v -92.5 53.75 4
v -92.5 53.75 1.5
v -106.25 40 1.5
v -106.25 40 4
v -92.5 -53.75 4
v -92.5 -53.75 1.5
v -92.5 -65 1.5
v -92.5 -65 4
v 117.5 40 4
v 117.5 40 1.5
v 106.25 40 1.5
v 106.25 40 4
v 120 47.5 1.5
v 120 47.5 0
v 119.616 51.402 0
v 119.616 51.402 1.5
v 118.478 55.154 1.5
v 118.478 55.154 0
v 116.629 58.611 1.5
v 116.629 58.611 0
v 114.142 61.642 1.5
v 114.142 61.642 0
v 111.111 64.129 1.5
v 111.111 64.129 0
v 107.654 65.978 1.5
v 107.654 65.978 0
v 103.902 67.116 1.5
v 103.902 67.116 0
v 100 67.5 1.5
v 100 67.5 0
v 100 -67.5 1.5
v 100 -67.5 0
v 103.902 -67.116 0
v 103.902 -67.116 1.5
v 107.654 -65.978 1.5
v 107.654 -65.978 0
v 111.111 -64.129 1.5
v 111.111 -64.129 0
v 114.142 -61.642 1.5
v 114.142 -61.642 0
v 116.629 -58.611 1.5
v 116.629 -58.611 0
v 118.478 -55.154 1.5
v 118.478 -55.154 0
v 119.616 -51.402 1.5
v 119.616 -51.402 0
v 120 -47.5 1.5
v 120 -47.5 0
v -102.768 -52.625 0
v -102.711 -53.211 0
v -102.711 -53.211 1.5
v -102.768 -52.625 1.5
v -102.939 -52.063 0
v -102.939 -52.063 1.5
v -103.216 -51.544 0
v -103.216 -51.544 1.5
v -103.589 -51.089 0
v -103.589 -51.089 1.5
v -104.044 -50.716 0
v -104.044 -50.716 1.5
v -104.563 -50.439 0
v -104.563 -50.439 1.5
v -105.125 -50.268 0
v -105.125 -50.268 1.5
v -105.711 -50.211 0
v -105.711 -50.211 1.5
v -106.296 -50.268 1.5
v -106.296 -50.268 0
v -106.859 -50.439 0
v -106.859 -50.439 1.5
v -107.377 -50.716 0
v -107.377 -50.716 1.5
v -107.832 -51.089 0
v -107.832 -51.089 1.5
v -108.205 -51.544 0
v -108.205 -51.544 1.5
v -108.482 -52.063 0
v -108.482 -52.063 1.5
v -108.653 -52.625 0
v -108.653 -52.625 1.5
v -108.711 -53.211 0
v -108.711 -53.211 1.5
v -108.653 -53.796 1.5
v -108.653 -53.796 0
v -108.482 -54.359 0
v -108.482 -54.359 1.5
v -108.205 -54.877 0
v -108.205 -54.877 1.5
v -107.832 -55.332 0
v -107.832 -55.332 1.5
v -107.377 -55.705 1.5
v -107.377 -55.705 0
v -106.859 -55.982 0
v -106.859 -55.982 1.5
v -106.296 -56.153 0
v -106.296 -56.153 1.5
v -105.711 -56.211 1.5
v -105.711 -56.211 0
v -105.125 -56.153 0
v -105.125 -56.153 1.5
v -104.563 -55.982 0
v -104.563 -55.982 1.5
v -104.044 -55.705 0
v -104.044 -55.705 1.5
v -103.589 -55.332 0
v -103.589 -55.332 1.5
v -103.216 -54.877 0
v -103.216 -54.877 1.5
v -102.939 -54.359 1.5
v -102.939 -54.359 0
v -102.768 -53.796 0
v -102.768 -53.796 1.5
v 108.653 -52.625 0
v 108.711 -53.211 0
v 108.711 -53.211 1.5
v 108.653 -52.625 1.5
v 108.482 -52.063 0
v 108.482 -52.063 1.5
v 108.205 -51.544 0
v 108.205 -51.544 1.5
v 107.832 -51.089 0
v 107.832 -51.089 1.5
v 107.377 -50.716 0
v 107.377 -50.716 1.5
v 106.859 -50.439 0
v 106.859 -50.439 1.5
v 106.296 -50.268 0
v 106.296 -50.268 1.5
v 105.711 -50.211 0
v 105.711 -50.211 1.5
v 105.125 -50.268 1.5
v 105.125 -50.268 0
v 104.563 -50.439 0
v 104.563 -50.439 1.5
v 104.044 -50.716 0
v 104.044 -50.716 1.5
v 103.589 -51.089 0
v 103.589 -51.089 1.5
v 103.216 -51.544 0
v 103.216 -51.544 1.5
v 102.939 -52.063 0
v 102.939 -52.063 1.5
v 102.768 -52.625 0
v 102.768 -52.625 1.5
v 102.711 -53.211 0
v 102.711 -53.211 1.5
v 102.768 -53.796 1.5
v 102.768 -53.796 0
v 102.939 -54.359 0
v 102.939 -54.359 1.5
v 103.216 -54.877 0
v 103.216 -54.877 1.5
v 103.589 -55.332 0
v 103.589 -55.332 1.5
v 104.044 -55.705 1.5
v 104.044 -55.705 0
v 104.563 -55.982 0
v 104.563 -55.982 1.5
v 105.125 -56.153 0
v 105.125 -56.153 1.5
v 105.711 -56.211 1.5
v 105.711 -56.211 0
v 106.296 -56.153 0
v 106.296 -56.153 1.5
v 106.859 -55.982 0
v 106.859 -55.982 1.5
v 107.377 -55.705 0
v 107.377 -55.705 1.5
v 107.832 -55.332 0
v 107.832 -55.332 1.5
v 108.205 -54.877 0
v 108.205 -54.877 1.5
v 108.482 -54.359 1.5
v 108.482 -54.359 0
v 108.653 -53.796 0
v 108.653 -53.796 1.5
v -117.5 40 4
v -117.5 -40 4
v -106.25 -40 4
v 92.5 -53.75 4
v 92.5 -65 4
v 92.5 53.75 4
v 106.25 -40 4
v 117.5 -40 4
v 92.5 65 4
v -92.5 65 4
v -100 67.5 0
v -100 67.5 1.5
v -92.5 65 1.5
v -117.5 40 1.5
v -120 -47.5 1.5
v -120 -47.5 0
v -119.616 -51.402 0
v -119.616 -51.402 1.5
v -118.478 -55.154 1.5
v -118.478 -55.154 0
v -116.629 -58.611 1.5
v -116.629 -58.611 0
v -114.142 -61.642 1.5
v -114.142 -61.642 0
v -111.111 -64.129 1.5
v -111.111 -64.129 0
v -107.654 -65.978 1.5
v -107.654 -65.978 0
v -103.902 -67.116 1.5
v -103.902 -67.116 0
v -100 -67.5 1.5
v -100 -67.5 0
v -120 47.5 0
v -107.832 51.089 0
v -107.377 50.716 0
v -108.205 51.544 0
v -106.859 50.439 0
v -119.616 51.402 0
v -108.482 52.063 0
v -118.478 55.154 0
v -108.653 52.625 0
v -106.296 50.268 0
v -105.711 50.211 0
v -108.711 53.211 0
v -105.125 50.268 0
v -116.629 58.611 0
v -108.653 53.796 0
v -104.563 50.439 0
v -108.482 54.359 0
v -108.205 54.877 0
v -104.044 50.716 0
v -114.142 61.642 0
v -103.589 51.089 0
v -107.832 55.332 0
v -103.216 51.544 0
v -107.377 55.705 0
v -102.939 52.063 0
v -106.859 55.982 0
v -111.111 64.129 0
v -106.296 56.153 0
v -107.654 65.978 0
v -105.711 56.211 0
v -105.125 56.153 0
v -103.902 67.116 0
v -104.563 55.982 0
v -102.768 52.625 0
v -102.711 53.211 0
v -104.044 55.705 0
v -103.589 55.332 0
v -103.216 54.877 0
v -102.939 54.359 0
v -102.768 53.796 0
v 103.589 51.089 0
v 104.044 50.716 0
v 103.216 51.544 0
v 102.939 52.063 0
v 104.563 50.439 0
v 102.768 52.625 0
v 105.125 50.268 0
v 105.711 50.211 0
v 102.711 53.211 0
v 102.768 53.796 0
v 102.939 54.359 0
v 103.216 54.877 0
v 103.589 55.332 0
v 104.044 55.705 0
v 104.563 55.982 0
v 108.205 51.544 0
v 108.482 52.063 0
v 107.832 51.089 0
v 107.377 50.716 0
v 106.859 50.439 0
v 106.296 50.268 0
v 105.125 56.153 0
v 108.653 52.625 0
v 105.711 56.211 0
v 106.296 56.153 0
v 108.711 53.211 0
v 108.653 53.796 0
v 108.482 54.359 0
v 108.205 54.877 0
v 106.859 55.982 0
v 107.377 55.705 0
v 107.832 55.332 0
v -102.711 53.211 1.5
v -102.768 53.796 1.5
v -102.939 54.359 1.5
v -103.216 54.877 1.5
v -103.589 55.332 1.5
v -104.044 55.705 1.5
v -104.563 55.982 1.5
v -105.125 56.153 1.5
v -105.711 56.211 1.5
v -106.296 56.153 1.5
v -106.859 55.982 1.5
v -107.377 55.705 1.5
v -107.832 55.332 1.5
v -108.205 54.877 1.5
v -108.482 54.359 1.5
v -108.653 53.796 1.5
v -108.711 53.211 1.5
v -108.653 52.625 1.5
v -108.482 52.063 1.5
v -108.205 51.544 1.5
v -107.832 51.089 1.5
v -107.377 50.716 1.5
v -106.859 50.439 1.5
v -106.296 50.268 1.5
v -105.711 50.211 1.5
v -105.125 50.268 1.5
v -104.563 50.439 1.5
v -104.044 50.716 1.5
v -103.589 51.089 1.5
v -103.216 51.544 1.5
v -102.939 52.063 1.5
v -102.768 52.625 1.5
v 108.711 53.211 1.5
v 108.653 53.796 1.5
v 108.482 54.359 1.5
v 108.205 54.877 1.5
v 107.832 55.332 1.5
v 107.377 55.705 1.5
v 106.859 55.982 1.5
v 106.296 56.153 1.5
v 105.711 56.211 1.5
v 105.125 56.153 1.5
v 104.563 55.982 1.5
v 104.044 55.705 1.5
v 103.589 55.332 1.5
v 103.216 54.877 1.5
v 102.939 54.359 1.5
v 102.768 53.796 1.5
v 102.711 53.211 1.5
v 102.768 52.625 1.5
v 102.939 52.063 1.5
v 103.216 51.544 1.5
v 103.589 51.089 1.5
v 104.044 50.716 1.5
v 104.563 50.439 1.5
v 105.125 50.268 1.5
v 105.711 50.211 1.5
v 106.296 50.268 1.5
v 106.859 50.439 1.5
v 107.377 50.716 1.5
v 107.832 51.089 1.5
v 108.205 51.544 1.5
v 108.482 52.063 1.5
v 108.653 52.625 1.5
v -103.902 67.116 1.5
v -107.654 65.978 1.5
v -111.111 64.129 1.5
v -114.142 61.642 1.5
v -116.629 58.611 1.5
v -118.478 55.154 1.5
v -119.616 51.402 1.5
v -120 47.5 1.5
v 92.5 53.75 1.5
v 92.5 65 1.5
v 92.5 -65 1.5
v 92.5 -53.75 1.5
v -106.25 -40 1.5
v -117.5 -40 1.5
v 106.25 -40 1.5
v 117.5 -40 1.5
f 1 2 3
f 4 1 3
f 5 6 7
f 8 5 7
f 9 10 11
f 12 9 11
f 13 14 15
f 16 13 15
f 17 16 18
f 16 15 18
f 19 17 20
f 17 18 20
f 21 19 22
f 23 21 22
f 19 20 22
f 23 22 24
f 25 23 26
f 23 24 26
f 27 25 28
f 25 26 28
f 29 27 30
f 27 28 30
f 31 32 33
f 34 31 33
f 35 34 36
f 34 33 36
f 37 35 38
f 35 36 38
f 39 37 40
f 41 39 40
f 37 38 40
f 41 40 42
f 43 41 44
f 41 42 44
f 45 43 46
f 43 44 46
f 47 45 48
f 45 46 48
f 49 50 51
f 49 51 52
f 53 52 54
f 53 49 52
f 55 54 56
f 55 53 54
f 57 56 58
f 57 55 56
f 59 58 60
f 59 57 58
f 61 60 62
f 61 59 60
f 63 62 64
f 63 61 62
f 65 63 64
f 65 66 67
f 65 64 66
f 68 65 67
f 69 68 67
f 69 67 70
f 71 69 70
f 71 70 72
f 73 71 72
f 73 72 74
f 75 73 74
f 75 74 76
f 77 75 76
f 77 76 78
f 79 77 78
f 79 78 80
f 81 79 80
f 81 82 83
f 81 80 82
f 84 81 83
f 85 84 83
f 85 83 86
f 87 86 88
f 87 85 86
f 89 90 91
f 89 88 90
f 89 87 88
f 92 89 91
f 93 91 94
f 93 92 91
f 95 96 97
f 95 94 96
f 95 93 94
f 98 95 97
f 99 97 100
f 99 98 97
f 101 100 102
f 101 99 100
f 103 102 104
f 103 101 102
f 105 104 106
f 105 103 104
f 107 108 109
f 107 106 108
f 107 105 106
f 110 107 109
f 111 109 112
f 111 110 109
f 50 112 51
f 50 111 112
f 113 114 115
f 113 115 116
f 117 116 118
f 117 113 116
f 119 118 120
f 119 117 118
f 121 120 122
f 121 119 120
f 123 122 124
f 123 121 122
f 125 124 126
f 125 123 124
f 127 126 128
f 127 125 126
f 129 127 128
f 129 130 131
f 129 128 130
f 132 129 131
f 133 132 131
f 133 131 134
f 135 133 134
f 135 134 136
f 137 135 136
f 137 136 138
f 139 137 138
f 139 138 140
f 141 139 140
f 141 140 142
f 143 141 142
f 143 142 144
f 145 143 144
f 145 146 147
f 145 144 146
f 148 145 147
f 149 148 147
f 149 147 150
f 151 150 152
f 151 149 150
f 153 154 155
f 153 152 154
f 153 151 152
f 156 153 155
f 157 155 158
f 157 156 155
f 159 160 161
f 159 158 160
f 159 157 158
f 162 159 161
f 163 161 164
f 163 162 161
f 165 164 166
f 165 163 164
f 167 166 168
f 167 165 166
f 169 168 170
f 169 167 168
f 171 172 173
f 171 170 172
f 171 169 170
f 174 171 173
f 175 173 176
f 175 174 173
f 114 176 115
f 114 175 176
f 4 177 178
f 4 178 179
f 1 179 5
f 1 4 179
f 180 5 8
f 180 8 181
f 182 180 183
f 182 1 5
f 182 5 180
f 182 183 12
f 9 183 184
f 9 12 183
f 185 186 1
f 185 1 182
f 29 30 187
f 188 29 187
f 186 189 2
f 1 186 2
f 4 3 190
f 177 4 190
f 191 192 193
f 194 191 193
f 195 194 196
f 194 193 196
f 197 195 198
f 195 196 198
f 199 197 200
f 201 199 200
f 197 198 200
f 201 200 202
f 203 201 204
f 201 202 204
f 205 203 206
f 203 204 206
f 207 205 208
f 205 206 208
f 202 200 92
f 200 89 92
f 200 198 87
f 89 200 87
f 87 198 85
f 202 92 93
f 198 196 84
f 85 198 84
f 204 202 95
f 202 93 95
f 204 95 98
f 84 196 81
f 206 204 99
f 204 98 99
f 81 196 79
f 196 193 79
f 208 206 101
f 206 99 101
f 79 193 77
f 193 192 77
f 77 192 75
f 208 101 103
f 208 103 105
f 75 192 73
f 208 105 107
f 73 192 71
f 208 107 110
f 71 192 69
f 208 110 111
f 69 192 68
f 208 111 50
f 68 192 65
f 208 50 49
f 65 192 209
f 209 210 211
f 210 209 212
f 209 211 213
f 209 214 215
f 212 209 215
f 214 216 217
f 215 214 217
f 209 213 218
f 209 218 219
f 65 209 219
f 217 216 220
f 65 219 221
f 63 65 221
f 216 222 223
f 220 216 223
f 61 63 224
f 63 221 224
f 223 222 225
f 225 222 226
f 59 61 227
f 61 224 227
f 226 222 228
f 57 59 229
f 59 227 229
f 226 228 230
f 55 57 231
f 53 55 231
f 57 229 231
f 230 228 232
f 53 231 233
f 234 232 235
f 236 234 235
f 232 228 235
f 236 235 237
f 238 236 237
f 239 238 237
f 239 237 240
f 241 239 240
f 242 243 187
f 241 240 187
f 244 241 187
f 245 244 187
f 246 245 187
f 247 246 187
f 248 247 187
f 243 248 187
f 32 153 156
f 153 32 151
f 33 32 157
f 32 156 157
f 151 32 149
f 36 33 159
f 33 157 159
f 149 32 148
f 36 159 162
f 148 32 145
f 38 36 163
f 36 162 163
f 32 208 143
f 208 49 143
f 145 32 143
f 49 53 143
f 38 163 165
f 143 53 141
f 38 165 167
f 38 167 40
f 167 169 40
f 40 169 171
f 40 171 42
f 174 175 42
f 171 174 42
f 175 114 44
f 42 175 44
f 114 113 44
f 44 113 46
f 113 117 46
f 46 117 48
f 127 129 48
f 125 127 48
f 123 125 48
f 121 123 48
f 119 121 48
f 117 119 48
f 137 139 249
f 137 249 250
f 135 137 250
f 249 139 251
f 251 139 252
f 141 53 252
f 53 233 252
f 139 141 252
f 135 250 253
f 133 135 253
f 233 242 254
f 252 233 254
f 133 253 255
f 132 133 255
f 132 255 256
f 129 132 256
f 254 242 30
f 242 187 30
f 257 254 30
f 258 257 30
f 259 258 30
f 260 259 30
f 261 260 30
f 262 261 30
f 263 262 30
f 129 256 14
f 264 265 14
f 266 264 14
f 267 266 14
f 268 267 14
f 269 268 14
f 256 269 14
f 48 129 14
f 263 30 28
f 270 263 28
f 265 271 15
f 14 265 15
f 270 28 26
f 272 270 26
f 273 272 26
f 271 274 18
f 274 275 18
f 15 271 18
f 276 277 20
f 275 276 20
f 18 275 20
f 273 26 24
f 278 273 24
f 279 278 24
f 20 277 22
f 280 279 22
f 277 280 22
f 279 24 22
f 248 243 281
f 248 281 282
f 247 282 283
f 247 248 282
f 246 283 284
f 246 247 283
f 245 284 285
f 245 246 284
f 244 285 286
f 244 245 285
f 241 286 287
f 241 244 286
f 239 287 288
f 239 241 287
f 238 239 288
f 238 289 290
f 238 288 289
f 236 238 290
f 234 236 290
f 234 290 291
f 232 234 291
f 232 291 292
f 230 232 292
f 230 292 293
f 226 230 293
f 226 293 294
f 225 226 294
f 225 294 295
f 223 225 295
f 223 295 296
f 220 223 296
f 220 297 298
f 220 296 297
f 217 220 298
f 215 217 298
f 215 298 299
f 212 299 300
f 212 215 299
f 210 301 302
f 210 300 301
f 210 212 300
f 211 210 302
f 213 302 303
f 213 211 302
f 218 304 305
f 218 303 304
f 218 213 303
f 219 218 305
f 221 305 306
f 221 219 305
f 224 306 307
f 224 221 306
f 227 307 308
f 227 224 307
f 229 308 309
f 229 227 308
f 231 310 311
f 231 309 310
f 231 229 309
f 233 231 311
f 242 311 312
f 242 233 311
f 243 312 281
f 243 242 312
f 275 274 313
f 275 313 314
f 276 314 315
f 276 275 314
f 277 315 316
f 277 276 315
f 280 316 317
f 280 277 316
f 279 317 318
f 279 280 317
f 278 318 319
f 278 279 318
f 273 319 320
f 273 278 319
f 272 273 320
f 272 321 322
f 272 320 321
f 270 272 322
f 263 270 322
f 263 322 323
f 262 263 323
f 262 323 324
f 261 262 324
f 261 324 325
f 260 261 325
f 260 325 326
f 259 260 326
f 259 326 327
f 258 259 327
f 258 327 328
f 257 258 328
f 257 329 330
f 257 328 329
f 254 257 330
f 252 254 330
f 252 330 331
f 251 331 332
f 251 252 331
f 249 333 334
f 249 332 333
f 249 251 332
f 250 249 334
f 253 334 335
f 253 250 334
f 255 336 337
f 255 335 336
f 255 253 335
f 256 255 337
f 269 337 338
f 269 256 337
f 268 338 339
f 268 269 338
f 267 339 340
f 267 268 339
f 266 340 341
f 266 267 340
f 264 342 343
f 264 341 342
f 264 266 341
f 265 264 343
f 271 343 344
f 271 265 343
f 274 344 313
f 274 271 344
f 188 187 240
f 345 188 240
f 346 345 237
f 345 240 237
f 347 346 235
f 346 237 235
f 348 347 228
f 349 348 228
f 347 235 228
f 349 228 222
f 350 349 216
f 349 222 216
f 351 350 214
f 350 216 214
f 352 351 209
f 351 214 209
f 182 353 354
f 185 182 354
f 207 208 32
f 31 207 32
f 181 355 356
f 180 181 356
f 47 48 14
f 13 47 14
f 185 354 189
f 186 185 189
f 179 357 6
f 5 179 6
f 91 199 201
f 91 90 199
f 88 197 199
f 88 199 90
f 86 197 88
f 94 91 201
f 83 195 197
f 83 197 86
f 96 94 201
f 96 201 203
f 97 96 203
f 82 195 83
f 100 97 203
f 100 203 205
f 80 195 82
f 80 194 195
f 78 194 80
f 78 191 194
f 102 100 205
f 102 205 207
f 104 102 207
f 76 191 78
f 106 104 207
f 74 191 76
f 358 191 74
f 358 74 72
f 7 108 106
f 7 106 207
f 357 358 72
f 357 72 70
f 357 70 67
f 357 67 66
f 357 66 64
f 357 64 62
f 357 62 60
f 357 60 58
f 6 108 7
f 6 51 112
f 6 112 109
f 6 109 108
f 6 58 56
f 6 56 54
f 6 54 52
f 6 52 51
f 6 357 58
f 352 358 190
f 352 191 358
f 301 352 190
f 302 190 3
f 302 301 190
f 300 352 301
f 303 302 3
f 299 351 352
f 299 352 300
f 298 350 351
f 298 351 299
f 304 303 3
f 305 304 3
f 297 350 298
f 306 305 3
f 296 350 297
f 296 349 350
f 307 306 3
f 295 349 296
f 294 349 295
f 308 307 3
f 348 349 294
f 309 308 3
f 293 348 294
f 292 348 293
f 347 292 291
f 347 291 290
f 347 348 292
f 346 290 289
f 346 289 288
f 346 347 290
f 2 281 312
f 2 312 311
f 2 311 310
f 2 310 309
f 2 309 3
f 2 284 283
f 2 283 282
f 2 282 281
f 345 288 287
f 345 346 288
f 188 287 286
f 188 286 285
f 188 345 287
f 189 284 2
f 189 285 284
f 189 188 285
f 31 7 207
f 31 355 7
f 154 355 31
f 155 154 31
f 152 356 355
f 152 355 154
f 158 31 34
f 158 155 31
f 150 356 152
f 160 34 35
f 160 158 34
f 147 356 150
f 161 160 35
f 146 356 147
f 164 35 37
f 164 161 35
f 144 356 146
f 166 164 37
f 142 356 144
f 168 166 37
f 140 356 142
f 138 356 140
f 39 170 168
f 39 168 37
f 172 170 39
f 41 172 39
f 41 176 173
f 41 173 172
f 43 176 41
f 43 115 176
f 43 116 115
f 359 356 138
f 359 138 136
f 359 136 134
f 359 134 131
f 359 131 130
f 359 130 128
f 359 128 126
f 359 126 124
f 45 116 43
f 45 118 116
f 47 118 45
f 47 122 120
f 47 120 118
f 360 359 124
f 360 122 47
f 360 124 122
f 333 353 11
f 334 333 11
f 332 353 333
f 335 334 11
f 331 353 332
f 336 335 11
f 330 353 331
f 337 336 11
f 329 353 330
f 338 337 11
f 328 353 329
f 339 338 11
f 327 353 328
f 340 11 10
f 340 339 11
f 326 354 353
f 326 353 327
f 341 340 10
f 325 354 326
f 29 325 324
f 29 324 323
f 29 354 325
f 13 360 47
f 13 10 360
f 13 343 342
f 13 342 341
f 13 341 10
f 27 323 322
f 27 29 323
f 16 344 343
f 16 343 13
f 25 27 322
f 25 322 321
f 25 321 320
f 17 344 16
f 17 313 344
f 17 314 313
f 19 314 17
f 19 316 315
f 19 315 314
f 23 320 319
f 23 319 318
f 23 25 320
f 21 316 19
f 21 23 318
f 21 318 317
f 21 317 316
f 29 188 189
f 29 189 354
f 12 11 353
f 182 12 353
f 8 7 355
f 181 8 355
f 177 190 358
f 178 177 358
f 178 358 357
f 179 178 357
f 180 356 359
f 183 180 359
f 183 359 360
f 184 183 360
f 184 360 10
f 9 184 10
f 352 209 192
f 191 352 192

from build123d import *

# Parameters (mm, degrees)
BOSS_EXTRUDE1_DEPTH     = 1.5
CUT_EXTRUDE1_DEPTH      = 138.689868908
CUT_EXTRUDE1_DEPTH_BACK = 138.689868908
SKETCH2_R               = 3
BOSS_EXTRUDE2_DEPTH     = 2.5


with BuildPart() as part:
    # Sketch1 → Boss-Extrude1 (new body)
    with BuildSketch(Plane.XY):
        with BuildLine():
            Line((-100, -67.5), (100, -67.5))
            ThreePointArc((100, -67.5), (114.142135624, -61.642135624), (120, -47.5))
            Line((120, -47.5), (120, 47.5))
            ThreePointArc((120, 47.5), (114.142135624, 61.642135624), (100, 67.5))
            Line((100, 67.5), (-100, 67.5))
            ThreePointArc((-100, 67.5), (-114.142135624, 61.642135624), (-120, 47.5))
            Line((-120, 47.5), (-120, -47.5))
            ThreePointArc((-120, -47.5), (-114.142135624, -61.642135624), (-100, -67.5))
        make_face()
    extrude(amount=BOSS_EXTRUDE1_DEPTH)

    # Sketch2 → Cut-Extrude1 (cut, two sides: drawn at the far end of the back side and taken through both)
    with BuildSketch(Plane.XY.offset(1.5).offset(-CUT_EXTRUDE1_DEPTH_BACK)):
        with Locations((105.710599836, 53.210599836)):
            Circle(SKETCH2_R)
        with Locations((105.710599836, -53.210599836)):
            Circle(SKETCH2_R)
        with Locations((-105.710599836, -53.210599836)):
            Circle(SKETCH2_R)
        with Locations((-105.710599836, 53.210599836)):
            Circle(SKETCH2_R)
    extrude(amount=CUT_EXTRUDE1_DEPTH + CUT_EXTRUDE1_DEPTH_BACK, mode=Mode.SUBTRACT)

    # Sketch2<3> → Boss-Extrude2 (add)
    with BuildSketch(Plane.XY.offset(1.5)):
        Polygon((-92.5, -53.75), (-92.5, -65), (92.5, -65), (92.5, -53.75), (106.25, -40), (117.5, -40), (117.5, 40), (106.25, 40), (92.5, 53.75), (92.5, 65), (-92.5, 65), (-92.5, 53.75), (-106.25, 40), (-117.5, 40), (-117.5, -40), (-106.25, -40), align=None)
    extrude(amount=BOSS_EXTRUDE2_DEPTH)


solid = part.part
